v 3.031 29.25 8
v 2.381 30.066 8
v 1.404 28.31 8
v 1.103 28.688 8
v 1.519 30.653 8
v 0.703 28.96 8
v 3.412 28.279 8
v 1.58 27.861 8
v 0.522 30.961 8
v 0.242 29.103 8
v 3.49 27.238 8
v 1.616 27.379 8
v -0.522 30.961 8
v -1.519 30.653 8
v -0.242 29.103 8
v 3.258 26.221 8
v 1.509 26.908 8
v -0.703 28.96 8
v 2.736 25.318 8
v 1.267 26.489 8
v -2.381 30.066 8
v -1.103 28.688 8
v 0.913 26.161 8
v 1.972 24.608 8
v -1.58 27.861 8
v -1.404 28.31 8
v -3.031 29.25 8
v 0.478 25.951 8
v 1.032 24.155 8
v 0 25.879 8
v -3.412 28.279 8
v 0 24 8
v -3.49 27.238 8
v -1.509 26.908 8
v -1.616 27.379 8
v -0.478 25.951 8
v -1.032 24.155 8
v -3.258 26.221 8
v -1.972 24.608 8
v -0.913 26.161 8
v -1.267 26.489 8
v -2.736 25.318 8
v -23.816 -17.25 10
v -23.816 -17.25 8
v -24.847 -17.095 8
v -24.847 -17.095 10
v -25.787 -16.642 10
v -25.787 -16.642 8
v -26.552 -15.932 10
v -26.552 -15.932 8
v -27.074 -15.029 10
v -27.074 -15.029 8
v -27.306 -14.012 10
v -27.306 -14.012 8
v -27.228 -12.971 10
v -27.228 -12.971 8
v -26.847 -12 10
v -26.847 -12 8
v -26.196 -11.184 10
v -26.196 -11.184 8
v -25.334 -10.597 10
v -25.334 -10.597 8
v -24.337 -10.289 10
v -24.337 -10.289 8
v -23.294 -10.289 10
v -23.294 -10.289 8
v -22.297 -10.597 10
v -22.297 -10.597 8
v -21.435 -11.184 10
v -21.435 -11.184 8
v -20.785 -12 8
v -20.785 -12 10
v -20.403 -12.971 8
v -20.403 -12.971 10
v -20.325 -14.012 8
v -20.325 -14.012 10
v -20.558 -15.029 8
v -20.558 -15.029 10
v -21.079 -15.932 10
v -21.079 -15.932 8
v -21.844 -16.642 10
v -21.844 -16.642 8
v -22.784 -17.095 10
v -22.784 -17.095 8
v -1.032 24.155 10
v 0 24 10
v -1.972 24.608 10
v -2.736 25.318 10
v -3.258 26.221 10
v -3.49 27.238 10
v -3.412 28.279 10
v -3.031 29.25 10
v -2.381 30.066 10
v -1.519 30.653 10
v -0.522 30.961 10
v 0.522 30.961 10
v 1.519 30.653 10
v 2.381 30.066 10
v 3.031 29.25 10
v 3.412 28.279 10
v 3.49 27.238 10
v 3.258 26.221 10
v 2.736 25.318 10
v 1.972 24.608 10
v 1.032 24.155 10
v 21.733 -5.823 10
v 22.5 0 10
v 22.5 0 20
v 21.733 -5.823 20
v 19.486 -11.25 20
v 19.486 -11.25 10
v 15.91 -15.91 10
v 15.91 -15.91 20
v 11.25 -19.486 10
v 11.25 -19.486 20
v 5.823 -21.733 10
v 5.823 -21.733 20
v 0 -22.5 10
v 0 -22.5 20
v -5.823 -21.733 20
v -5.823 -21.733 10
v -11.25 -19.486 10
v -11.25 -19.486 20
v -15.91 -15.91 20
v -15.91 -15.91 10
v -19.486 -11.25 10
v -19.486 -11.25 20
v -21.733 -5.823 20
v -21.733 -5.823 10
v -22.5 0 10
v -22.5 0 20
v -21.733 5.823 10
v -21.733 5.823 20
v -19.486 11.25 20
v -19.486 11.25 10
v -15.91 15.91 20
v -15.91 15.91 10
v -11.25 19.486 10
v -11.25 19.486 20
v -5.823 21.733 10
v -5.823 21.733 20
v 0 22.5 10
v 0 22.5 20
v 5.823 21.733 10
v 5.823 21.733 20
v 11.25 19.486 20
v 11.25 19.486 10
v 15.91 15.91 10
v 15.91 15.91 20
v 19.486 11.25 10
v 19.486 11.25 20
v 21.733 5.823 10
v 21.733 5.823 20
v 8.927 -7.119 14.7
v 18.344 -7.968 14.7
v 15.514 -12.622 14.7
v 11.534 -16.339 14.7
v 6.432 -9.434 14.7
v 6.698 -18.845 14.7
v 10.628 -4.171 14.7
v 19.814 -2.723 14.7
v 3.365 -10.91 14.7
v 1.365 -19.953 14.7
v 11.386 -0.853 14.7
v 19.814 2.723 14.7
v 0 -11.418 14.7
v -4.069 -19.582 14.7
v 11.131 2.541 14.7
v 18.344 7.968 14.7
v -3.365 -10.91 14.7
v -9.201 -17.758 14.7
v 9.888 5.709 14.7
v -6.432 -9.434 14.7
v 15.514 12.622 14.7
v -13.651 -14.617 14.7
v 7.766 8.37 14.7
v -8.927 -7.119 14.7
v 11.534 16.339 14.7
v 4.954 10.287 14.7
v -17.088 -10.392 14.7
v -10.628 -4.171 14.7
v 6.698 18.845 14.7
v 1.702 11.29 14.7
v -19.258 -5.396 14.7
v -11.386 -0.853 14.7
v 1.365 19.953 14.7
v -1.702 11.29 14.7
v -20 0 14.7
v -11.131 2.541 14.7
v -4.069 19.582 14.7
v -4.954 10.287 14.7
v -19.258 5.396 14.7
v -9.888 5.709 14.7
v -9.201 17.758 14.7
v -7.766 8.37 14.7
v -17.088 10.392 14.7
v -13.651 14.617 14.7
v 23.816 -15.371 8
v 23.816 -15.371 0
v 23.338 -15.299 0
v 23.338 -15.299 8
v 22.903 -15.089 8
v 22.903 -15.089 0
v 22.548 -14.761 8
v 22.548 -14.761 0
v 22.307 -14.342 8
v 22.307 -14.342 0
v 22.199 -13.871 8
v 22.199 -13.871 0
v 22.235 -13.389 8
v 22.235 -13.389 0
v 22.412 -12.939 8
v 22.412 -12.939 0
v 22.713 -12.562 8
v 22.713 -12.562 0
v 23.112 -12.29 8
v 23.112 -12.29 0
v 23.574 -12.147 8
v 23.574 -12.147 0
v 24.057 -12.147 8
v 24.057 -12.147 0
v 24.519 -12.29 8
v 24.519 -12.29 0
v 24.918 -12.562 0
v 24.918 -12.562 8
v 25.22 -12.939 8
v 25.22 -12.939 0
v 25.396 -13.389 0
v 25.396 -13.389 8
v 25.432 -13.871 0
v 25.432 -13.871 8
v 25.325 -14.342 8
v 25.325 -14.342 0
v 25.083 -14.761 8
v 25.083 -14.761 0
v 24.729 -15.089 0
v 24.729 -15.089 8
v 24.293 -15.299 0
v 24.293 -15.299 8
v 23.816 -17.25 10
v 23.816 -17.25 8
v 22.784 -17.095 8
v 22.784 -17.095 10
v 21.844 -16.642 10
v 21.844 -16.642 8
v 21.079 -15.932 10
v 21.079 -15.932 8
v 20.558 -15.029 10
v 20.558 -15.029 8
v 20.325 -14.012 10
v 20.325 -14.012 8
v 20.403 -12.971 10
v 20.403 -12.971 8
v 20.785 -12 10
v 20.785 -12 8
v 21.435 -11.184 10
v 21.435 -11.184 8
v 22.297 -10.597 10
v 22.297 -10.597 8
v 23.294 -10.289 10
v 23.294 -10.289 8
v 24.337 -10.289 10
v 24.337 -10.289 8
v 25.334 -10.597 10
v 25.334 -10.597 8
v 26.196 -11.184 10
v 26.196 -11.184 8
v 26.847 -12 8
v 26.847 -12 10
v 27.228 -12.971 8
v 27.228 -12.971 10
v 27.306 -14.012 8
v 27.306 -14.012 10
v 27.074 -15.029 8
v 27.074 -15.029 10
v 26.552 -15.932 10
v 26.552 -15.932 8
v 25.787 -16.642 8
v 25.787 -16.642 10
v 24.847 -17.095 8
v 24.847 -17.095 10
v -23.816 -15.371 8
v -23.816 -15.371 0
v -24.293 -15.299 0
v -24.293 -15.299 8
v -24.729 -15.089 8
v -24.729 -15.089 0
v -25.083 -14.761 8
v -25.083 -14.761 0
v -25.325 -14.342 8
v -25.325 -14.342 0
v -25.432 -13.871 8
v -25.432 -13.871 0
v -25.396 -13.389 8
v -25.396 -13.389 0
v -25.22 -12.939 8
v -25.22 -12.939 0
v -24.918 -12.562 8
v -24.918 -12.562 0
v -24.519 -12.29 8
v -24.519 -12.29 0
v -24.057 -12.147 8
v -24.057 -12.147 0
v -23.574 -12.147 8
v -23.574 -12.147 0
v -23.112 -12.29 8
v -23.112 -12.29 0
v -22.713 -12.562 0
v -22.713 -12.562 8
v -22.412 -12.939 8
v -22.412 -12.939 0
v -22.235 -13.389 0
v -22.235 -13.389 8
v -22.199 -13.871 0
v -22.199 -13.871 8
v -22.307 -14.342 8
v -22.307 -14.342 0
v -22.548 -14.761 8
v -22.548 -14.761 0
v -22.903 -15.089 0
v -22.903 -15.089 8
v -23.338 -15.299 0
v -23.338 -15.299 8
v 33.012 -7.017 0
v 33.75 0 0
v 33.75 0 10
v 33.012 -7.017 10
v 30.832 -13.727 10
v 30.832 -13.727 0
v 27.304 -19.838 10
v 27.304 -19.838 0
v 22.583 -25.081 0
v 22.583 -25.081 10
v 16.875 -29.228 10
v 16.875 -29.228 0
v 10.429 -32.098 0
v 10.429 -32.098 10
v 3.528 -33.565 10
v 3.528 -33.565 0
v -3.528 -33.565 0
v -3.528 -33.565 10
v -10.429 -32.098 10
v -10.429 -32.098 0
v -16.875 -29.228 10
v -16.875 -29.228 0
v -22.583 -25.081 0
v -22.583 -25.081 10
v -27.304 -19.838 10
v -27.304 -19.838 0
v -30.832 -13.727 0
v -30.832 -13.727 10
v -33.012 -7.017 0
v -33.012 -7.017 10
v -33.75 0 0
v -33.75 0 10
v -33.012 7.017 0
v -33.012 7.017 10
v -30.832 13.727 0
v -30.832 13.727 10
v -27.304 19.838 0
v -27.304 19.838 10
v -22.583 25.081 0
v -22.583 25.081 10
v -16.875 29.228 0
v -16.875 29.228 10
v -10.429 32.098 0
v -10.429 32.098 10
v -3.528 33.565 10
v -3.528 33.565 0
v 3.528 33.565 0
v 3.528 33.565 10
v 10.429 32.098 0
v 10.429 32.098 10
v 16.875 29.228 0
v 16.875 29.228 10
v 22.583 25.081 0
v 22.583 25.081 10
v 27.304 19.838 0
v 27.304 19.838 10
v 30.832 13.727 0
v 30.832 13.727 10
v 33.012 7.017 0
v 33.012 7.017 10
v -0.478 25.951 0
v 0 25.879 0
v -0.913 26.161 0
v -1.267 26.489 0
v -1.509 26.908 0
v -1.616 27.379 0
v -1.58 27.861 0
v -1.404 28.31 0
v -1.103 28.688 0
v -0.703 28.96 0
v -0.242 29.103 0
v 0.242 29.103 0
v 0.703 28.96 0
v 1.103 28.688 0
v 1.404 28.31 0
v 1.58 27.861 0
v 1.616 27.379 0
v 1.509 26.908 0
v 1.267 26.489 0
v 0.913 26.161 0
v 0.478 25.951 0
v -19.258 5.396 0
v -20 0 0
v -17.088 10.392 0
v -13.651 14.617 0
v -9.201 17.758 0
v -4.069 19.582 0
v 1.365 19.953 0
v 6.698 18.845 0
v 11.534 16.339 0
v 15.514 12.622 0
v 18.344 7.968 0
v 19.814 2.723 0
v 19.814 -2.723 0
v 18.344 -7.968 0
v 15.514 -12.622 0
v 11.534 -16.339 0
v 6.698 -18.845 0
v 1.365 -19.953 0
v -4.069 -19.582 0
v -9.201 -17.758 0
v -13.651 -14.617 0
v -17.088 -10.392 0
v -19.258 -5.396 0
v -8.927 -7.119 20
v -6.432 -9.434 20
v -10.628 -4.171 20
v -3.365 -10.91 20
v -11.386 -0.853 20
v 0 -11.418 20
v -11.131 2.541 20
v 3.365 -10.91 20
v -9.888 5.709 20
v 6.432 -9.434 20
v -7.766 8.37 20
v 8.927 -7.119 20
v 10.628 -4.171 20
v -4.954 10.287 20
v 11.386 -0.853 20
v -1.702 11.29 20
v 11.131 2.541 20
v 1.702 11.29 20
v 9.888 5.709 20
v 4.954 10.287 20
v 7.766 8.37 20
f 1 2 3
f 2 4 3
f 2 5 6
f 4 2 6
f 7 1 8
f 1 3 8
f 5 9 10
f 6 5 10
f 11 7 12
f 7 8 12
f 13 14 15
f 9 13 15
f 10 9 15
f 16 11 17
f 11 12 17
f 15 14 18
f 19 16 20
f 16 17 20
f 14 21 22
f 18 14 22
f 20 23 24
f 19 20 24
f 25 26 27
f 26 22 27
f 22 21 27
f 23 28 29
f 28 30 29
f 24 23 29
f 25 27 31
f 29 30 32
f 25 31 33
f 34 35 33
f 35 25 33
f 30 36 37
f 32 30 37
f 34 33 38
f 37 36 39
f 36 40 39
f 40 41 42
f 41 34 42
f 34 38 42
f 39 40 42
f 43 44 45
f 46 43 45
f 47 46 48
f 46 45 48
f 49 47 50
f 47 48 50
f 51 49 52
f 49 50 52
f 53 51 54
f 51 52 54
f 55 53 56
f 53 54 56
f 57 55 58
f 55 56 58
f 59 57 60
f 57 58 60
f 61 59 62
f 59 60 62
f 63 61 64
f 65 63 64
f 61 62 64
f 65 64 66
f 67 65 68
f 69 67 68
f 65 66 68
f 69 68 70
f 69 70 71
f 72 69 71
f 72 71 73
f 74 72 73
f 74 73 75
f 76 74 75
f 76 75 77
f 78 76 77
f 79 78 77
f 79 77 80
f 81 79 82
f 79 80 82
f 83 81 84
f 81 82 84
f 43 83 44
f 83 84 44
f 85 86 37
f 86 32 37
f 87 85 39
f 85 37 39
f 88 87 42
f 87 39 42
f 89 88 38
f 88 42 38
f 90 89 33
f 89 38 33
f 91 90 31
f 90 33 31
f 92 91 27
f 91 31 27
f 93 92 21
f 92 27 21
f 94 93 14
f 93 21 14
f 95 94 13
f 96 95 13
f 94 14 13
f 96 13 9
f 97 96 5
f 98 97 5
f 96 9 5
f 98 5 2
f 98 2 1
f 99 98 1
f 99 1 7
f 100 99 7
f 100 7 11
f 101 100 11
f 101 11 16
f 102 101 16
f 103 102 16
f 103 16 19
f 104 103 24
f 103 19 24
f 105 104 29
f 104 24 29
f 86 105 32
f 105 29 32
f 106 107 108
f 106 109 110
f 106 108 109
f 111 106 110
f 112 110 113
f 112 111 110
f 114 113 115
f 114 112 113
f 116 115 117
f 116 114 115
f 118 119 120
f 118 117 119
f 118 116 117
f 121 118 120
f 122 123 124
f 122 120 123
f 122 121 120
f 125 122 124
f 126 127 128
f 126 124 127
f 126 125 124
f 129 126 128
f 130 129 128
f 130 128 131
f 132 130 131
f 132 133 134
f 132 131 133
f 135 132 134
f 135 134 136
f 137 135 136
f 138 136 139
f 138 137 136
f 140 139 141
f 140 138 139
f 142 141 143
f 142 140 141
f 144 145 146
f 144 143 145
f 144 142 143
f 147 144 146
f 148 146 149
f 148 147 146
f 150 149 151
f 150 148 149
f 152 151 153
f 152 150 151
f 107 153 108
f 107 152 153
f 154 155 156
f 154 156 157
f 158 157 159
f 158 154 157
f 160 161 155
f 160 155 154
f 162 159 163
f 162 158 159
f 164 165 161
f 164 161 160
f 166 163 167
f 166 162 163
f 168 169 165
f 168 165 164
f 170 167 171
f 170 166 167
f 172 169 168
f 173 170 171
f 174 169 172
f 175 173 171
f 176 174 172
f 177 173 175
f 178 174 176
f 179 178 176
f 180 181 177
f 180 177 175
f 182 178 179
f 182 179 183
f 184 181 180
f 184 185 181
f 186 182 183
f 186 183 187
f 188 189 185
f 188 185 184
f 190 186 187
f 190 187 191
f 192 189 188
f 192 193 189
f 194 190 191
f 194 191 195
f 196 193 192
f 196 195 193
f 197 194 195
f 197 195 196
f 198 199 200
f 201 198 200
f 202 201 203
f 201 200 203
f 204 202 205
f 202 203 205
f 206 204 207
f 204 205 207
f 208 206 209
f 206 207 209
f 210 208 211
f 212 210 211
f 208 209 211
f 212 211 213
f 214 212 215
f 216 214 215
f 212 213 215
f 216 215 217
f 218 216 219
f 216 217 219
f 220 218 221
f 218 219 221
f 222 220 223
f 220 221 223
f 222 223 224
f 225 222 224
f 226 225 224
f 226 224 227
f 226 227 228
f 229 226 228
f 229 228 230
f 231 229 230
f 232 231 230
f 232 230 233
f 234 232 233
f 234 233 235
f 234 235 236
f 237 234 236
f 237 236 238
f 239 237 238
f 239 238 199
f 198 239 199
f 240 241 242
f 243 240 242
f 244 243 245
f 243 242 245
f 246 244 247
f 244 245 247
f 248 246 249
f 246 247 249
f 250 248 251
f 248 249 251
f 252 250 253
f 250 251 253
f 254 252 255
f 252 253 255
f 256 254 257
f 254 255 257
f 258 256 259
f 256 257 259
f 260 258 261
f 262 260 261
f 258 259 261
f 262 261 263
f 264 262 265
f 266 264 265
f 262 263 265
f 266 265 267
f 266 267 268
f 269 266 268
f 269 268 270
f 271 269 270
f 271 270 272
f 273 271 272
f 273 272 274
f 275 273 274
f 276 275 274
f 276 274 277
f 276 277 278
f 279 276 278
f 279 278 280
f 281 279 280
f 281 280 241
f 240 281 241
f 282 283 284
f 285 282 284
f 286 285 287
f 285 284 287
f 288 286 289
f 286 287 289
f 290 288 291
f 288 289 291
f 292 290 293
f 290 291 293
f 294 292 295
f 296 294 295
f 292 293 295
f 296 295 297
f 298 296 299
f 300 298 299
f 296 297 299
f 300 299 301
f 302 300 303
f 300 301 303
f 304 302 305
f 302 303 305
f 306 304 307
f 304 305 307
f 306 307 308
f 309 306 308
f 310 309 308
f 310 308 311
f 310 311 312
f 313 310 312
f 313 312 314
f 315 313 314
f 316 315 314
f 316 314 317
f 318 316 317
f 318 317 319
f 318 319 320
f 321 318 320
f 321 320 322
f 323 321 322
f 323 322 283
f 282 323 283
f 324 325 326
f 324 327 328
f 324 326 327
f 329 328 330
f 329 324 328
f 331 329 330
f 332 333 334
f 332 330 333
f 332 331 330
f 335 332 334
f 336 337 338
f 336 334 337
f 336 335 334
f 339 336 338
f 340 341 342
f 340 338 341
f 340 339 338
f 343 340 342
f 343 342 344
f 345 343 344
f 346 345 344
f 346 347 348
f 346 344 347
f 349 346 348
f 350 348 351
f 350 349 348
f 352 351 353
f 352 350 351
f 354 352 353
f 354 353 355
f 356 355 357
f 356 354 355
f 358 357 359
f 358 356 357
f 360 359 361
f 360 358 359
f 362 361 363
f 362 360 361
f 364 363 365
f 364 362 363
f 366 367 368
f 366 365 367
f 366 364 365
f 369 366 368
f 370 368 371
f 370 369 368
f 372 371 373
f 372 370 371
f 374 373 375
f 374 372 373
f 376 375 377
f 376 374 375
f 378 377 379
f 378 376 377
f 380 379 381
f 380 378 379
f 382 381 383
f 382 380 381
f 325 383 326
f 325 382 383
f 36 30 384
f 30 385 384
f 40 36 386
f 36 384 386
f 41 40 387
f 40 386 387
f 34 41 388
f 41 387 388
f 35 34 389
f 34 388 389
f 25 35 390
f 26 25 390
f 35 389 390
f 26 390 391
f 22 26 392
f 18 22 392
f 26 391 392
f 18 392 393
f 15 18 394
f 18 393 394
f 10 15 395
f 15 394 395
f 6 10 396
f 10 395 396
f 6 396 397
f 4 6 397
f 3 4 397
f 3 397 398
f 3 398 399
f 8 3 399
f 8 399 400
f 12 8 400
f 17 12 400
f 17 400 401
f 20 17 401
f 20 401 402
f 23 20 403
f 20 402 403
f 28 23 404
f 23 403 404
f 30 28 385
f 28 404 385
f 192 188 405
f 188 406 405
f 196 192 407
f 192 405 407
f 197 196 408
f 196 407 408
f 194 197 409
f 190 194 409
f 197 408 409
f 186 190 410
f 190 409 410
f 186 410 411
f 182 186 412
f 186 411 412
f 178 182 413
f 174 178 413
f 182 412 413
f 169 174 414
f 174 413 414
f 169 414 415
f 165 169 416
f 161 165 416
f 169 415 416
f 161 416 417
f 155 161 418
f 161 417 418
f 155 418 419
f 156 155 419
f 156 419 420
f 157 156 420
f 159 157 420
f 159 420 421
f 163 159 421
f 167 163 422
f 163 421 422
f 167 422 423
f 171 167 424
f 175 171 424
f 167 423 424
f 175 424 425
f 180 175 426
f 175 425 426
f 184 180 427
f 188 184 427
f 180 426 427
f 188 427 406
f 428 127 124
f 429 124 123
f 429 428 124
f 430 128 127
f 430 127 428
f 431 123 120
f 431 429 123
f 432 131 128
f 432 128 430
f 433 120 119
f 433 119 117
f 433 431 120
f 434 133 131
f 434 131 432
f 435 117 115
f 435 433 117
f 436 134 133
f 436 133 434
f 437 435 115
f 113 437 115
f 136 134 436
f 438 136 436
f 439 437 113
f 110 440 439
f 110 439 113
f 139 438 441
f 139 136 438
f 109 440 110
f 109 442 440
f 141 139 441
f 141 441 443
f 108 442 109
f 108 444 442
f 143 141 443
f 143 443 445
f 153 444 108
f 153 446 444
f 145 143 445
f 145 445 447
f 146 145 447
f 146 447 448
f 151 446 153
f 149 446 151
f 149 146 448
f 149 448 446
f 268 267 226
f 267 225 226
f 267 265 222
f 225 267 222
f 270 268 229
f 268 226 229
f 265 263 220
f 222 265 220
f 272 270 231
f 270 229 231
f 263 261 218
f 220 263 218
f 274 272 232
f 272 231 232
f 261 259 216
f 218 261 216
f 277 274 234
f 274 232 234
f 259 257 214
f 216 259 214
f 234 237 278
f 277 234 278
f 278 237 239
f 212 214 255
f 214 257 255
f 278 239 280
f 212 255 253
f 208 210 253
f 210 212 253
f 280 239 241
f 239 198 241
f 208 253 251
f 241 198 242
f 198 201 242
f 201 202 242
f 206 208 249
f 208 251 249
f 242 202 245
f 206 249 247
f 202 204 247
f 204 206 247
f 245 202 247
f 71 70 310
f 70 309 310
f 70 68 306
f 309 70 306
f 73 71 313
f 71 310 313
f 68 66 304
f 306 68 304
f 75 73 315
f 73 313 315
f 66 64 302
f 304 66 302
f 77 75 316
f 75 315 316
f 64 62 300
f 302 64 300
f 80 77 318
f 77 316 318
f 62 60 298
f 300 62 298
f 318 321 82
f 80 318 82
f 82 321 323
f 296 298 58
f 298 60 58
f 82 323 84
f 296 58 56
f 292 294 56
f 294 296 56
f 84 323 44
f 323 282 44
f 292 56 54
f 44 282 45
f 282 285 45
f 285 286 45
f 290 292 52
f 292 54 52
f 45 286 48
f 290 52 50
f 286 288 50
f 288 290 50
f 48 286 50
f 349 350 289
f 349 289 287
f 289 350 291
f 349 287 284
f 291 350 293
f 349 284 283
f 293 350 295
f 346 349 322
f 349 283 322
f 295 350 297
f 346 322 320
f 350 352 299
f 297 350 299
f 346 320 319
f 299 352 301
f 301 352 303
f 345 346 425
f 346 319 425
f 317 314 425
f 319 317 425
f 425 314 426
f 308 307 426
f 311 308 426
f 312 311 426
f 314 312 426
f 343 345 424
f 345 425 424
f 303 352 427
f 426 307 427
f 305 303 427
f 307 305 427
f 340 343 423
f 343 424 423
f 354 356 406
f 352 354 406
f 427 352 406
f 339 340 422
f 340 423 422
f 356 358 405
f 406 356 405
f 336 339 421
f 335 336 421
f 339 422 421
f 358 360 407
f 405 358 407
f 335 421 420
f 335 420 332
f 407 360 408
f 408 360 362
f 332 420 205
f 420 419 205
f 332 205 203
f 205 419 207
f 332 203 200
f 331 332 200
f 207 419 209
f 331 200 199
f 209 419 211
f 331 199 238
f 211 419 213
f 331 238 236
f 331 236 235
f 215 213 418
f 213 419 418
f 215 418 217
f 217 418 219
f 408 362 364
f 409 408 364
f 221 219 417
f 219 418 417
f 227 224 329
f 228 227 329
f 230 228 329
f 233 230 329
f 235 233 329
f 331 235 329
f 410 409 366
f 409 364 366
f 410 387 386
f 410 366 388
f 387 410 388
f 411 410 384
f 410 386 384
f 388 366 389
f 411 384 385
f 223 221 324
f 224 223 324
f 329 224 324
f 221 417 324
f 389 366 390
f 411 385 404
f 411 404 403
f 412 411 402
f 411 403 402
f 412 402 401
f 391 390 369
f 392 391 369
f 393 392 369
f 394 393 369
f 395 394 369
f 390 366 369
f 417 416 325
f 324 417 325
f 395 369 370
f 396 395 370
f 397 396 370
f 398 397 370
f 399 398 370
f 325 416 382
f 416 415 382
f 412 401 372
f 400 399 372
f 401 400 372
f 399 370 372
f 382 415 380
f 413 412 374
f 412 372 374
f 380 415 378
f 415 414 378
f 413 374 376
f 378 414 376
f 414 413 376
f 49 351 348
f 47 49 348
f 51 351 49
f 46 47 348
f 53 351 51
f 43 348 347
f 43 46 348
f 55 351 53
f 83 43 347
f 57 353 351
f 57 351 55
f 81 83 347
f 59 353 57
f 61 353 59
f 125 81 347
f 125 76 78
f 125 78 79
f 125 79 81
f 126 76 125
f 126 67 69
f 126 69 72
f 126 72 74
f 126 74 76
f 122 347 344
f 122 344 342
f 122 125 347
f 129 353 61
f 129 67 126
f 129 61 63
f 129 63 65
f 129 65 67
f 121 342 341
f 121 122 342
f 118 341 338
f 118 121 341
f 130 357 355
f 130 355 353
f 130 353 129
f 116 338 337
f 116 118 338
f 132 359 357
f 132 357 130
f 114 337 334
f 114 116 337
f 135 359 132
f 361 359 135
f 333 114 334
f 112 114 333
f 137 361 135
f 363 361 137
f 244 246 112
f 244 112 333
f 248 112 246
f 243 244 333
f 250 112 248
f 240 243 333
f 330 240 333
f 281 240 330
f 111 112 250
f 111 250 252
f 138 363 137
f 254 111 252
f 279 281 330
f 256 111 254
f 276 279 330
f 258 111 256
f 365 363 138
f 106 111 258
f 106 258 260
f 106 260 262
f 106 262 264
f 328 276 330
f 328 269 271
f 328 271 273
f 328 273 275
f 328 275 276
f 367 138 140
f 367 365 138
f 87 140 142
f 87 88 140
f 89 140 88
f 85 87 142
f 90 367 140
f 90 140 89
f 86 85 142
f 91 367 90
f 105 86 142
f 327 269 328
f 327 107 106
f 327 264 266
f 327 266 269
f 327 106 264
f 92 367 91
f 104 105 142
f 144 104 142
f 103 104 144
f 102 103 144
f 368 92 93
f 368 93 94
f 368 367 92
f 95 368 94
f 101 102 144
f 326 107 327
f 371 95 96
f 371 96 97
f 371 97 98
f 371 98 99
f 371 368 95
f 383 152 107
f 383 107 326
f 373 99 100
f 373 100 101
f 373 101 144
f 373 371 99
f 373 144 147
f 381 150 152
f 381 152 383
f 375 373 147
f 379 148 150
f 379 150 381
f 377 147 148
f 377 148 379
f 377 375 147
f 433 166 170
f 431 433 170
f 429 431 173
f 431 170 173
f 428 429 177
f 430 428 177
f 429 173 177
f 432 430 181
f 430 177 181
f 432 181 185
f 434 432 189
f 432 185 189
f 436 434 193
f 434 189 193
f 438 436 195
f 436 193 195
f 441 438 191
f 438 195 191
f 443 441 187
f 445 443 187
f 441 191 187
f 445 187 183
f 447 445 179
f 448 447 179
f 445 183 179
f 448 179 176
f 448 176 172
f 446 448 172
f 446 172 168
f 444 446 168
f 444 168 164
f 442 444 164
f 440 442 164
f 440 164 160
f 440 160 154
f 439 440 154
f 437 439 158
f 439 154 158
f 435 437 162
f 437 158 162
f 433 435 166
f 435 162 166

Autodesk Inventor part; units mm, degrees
ref_plane "YZ Plane" through (0, 0, 0) normal (1, 0, 0) x (0, 1, 0)
ref_plane "XZ Plane" through (0, 0, 0) normal (0, 1, 0) x (-1, 0, 0)
ref_plane "XY Plane" through (0, 0, 0) normal (0, 0, 1) x (1, 0, 0)
sketch "Sketch3" plane through (0, 0, 0) normal (0, 0, 1) x (1, 0, 0)
  circle A0 centre (0, 0) radius 33.75
  dimension "d7" = 67.5
extrude "baseExtrusion" add sketch "Sketch3" along normal blind 10
sketch "Sketch4" plane through (0, 0, 10) normal (0, 0, 1) x (1, 0, 0)
  circle A0 centre (0, 0) radius 22.5
  dimension "d10" = 45
extrude "objectiveMountExtrusion" add sketch "Sketch4" along normal blind 10
sketch "Sketch5" plane through (0, 0, 20) normal (0, 0, 1) x (1, 0, 0)
  point P0 (0, 0)
  point P1 (0, 0)
hole "objectiveThread" at (0, 0, 20) direction (0, 0, -1) diameter 22.835 end through all thread size "M25x2" class "6H" standard "ISO Metric profile"
sketch "Sketch6" plane through (0, 0, 0) normal (0, 0, -1) x (-1, 0, 0)
  circle A0 centre (0, 0) radius 20
  dimension "d20" = 40
extrude "objectiveClearance" cut sketch "Sketch6" against normal blind 14.7
sketch "Sketch7" plane through (0, 0, 10) normal (0, 0, 1) x (1, 0, 0)
  point P0 (0, 0)
  point P1 (0, 27.5)
  point P2 (-23.8157, -13.75)
  point P3 (23.8157, -13.75)
  dimension "d23" = 27.5
  dimension "d26" = 360
hole "holeMounts" at (0, 27.5, 10) at (-23.8157, -13.75, 10) at (23.8157, -13.75, 10) direction (0, 0, -1) diameter 3.242 end through all counterbore diameter 7 counterbore depth 2 thread size "M4x0.7" class "6H" standard "ISO Metric profile"
properties part number "cylindricalObjectiveHolder"
